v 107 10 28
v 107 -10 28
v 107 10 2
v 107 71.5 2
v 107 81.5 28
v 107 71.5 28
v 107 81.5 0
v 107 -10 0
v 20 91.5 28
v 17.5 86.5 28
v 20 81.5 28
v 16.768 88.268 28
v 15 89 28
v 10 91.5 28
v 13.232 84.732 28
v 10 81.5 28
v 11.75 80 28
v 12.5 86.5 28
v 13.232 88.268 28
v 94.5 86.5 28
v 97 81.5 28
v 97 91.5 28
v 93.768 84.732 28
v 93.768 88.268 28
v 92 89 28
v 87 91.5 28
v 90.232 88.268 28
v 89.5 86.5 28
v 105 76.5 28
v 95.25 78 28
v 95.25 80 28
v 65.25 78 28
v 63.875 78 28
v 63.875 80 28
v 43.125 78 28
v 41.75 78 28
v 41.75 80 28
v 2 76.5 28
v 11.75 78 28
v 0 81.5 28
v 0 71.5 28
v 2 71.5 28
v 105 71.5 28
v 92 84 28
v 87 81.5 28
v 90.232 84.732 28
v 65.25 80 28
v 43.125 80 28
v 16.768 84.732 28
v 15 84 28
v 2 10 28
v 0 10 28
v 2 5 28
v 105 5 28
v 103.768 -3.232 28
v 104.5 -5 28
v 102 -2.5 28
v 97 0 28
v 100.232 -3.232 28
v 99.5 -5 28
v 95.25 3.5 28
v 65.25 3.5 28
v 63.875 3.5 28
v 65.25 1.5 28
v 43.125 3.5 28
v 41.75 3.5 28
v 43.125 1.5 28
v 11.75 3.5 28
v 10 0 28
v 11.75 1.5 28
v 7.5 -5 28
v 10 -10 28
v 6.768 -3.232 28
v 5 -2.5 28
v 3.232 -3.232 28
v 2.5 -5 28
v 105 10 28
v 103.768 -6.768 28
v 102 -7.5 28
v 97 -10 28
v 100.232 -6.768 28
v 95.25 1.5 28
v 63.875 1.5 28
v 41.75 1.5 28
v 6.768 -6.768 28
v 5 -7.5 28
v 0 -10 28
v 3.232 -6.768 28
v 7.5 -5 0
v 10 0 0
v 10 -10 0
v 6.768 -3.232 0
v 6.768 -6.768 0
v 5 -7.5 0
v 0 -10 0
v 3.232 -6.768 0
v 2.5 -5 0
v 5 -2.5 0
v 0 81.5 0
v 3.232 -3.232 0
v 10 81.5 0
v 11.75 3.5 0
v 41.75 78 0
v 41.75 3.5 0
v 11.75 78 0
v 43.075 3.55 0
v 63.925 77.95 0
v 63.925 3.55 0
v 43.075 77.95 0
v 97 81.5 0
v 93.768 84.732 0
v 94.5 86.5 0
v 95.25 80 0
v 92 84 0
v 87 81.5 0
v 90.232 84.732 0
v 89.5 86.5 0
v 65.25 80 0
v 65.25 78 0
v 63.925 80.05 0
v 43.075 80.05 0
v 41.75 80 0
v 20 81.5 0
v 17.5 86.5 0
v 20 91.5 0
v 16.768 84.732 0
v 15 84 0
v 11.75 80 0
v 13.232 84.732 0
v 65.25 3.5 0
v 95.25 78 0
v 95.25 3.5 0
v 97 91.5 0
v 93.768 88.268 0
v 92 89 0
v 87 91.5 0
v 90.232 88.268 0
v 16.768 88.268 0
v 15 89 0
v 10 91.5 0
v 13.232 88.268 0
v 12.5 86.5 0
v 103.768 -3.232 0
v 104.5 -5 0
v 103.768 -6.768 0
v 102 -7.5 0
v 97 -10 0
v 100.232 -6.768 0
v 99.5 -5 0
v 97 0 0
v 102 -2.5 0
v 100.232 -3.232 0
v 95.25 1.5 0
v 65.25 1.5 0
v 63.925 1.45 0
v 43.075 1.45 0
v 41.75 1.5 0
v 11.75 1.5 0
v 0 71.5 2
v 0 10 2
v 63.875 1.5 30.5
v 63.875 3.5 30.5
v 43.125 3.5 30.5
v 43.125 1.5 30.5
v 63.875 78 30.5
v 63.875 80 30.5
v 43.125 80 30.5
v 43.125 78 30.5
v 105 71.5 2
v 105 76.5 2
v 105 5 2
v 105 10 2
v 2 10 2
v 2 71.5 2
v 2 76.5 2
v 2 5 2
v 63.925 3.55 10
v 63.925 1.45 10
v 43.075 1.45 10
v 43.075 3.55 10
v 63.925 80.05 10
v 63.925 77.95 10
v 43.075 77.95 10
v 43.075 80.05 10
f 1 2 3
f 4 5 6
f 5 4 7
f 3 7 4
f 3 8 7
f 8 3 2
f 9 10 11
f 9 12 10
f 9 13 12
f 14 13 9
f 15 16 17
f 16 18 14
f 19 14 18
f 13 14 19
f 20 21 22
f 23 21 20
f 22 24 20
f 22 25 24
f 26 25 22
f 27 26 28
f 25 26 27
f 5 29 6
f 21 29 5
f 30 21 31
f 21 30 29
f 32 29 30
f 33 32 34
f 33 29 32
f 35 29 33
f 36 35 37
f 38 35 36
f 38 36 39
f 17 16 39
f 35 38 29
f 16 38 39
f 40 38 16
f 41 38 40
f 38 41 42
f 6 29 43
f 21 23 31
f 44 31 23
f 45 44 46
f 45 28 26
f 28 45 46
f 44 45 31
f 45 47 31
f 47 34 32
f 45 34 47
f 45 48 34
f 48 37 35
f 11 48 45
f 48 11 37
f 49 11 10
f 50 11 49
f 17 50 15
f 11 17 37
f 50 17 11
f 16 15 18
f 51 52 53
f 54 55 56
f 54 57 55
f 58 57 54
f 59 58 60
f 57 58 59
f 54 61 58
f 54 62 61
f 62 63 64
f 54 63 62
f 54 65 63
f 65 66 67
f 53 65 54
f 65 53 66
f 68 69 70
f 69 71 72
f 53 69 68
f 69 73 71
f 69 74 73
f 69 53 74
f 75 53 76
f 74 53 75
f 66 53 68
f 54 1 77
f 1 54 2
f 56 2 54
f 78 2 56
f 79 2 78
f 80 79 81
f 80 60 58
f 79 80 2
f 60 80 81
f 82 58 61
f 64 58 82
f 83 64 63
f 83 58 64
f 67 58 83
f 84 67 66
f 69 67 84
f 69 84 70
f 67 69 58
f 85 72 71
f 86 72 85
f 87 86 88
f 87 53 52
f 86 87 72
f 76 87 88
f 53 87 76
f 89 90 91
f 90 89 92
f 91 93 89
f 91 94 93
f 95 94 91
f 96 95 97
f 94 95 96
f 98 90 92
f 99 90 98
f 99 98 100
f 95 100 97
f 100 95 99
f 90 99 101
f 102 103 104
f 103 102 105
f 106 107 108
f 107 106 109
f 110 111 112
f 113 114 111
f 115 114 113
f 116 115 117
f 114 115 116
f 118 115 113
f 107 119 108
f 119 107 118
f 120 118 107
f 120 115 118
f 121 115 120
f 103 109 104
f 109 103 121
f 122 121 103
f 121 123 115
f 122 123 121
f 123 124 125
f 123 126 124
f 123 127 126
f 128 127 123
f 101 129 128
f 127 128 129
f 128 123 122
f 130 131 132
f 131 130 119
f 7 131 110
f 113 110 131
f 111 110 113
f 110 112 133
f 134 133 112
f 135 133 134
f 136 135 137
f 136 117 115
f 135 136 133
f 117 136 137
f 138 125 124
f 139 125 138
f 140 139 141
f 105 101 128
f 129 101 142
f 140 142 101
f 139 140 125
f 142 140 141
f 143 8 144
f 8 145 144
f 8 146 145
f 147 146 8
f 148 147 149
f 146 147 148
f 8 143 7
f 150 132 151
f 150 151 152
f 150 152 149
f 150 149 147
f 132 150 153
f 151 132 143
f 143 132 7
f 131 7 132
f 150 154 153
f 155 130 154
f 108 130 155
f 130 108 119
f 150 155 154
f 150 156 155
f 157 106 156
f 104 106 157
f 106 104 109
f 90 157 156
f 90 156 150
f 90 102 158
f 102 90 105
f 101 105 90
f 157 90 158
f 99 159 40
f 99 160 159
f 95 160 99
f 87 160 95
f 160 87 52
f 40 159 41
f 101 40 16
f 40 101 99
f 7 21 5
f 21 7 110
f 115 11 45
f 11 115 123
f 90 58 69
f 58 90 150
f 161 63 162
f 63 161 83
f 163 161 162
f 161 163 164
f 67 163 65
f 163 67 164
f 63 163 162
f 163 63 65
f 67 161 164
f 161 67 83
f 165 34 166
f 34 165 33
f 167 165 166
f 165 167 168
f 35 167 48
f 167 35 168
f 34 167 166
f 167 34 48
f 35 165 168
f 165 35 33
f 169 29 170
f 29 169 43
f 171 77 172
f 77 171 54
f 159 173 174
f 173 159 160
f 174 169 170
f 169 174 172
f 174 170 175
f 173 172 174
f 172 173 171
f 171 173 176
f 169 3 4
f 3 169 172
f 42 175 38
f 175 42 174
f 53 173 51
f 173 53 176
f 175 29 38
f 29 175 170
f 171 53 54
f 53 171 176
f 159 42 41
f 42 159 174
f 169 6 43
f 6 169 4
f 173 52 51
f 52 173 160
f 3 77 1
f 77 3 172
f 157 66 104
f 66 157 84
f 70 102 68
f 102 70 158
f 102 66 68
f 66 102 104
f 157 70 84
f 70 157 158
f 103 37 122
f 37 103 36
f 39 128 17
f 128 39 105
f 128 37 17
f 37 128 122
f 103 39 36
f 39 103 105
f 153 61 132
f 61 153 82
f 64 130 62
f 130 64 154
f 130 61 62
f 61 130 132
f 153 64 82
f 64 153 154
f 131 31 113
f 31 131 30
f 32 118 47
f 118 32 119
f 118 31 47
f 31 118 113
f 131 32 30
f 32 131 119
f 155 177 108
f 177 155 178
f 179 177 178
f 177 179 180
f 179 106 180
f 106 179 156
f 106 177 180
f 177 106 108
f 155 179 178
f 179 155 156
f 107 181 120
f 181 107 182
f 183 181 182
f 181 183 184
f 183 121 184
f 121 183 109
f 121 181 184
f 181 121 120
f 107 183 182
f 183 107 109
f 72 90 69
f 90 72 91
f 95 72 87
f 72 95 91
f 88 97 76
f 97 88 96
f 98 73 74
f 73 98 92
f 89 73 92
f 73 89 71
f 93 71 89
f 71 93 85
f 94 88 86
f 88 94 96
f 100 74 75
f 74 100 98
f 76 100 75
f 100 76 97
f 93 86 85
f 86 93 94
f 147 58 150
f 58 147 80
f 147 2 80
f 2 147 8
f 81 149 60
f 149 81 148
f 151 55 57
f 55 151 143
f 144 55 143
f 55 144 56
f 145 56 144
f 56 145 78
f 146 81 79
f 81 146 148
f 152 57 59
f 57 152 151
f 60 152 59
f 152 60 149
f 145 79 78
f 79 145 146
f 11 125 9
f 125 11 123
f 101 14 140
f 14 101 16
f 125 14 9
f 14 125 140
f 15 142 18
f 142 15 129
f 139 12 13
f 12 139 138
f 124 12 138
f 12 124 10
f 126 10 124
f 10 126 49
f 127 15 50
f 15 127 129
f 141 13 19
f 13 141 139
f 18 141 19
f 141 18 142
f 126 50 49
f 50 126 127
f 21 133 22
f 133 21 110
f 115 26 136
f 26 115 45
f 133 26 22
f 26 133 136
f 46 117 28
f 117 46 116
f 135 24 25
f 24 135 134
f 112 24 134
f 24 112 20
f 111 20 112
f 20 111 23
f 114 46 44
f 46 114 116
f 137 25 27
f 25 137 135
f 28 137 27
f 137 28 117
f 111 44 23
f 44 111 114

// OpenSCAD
sdr_width=103;
sdr_height=71.5;
sdr_depth=26;

base=2; // w and d
base_h=5;

offset=10;

strap_w=30;
strap_h=2;
stack_width=sdr_width/4-offset/2;
tol=0.05;
    
hook_out=5;
hook_in=2.5;

array_width=148;
array_height=110;
array_depth=30;

array_screw_hole_width1=1.75; //r screw
array_screw_hole_width2=2; //r screw

poe_screw_hole_width1=1.3; //r screw
poe_screw_hole_width2=1.7; //r screw

array_hole_out=18;
array_hole_in=7;
    
    
module hollow_cylinder(out,in,height) {
    difference() {
        //cylinder(height,out,out);
        translate([-out,-out,0]) cube([out*2,out*2,height]);
        cylinder(height,in,in);
    }
}
module sdr_box() {
    cube([sdr_width+base*2, sdr_height+base_h*2, sdr_depth+base]);
    
    translate([sdr_width/2-stack_width/2+base,-strap_h/2+base_h/2,base]) cube([stack_width,strap_h,sdr_depth+offset/4]);
    
    translate([sdr_width/2-stack_width/2+base,base_h+base_h/2-strap_h/2+sdr_height,base]) cube([stack_width,strap_h,sdr_depth+offset/4]);
}
    
module sdr_cutout() {
            //base
            translate([base,base_h,base]) difference() {
                union() {
                    cube([sdr_width, sdr_height, sdr_depth]);
                    translate([-base*2,offset/2,0]) cube([sdr_width+base*4, sdr_height-offset, sdr_depth]);
                }
            }

            //velcro straps
            for (i = [1,3]) {
                    translate([i*(sdr_width+base*2)/4-strap_w/2,base_h/2-strap_h/2,-offset/2]) cube([strap_w,strap_h,sdr_depth+base+offset]);
                    translate([i*(sdr_width+base*2)/4-strap_w/2,base_h+base_h/2-strap_h/2+sdr_height,-offset/2]) cube([strap_w,strap_h,sdr_depth+base+offset]);
                    
            }

        
        translate([sdr_width/2-stack_width/2+base-tol,-strap_h/2+base_h/2-tol,0]) cube([stack_width+tol*2,strap_h+tol*2,offset]);
            
        translate([sdr_width/2-stack_width/2+base-tol,base_h+base_h/2-strap_h/2+sdr_height-tol,0]) cube([stack_width+tol*2,strap_h+tol*2,offset]);
}


module ziptie_points(height,depth) {
    translate([hook_out,-hook_out]) hollow_cylinder(hook_out,hook_in,height=depth);
    translate([sdr_width+base*2-hook_out,-hook_out]) hollow_cylinder(hook_out,hook_in,height=depth);
    //height=sdr_height+base_h*2;
    translate([hook_out*3,hook_out+height]) hollow_cylinder(hook_out,hook_in,height=depth);
    translate([sdr_width+base*2-3*hook_out,hook_out+height]) hollow_cylinder(hook_out,hook_in,height=depth);
}

module sdr_unit() {
    difference() {
        sdr_box();
        sdr_cutout();
    }
    ziptie_points(height=sdr_height+base_h*2, depth=sdr_depth+base);
}



module holes(xp,yp,r1,r2) {
    for (y = [xp/2,-xp/2]) {
        for (x=[yp/2, -yp/2]) {
            translate([x,y,-1]) cylinder(h=array_depth+2,r1=r1,r2=r2);
        }
    }
}

module array_mount() {
    difference() {
        union() {
            cube([array_width,array_height,array_depth]); 
            translate([(array_width-sdr_width)/2,0,0]) ziptie_points(height=array_height,depth=array_depth);
            translate([array_width/2,array_height+10]) hollow_cylinder(array_hole_out,array_hole_in,array_depth);
        }
        translate([array_width/2,array_height/2+10]) holes(51.6,86.2,array_screw_hole_width1,array_screw_hole_width2); //antenna mount
        translate([array_width/2,array_height/2]) holes(61.6,134.7,poe_screw_hole_width1,poe_screw_hole_width2); //poe
        
        translate([0,10,array_depth/2]) cube([array_width,array_height*2,array_depth/2]);
    }

}

sdr_unit();

        
//array_mount();
